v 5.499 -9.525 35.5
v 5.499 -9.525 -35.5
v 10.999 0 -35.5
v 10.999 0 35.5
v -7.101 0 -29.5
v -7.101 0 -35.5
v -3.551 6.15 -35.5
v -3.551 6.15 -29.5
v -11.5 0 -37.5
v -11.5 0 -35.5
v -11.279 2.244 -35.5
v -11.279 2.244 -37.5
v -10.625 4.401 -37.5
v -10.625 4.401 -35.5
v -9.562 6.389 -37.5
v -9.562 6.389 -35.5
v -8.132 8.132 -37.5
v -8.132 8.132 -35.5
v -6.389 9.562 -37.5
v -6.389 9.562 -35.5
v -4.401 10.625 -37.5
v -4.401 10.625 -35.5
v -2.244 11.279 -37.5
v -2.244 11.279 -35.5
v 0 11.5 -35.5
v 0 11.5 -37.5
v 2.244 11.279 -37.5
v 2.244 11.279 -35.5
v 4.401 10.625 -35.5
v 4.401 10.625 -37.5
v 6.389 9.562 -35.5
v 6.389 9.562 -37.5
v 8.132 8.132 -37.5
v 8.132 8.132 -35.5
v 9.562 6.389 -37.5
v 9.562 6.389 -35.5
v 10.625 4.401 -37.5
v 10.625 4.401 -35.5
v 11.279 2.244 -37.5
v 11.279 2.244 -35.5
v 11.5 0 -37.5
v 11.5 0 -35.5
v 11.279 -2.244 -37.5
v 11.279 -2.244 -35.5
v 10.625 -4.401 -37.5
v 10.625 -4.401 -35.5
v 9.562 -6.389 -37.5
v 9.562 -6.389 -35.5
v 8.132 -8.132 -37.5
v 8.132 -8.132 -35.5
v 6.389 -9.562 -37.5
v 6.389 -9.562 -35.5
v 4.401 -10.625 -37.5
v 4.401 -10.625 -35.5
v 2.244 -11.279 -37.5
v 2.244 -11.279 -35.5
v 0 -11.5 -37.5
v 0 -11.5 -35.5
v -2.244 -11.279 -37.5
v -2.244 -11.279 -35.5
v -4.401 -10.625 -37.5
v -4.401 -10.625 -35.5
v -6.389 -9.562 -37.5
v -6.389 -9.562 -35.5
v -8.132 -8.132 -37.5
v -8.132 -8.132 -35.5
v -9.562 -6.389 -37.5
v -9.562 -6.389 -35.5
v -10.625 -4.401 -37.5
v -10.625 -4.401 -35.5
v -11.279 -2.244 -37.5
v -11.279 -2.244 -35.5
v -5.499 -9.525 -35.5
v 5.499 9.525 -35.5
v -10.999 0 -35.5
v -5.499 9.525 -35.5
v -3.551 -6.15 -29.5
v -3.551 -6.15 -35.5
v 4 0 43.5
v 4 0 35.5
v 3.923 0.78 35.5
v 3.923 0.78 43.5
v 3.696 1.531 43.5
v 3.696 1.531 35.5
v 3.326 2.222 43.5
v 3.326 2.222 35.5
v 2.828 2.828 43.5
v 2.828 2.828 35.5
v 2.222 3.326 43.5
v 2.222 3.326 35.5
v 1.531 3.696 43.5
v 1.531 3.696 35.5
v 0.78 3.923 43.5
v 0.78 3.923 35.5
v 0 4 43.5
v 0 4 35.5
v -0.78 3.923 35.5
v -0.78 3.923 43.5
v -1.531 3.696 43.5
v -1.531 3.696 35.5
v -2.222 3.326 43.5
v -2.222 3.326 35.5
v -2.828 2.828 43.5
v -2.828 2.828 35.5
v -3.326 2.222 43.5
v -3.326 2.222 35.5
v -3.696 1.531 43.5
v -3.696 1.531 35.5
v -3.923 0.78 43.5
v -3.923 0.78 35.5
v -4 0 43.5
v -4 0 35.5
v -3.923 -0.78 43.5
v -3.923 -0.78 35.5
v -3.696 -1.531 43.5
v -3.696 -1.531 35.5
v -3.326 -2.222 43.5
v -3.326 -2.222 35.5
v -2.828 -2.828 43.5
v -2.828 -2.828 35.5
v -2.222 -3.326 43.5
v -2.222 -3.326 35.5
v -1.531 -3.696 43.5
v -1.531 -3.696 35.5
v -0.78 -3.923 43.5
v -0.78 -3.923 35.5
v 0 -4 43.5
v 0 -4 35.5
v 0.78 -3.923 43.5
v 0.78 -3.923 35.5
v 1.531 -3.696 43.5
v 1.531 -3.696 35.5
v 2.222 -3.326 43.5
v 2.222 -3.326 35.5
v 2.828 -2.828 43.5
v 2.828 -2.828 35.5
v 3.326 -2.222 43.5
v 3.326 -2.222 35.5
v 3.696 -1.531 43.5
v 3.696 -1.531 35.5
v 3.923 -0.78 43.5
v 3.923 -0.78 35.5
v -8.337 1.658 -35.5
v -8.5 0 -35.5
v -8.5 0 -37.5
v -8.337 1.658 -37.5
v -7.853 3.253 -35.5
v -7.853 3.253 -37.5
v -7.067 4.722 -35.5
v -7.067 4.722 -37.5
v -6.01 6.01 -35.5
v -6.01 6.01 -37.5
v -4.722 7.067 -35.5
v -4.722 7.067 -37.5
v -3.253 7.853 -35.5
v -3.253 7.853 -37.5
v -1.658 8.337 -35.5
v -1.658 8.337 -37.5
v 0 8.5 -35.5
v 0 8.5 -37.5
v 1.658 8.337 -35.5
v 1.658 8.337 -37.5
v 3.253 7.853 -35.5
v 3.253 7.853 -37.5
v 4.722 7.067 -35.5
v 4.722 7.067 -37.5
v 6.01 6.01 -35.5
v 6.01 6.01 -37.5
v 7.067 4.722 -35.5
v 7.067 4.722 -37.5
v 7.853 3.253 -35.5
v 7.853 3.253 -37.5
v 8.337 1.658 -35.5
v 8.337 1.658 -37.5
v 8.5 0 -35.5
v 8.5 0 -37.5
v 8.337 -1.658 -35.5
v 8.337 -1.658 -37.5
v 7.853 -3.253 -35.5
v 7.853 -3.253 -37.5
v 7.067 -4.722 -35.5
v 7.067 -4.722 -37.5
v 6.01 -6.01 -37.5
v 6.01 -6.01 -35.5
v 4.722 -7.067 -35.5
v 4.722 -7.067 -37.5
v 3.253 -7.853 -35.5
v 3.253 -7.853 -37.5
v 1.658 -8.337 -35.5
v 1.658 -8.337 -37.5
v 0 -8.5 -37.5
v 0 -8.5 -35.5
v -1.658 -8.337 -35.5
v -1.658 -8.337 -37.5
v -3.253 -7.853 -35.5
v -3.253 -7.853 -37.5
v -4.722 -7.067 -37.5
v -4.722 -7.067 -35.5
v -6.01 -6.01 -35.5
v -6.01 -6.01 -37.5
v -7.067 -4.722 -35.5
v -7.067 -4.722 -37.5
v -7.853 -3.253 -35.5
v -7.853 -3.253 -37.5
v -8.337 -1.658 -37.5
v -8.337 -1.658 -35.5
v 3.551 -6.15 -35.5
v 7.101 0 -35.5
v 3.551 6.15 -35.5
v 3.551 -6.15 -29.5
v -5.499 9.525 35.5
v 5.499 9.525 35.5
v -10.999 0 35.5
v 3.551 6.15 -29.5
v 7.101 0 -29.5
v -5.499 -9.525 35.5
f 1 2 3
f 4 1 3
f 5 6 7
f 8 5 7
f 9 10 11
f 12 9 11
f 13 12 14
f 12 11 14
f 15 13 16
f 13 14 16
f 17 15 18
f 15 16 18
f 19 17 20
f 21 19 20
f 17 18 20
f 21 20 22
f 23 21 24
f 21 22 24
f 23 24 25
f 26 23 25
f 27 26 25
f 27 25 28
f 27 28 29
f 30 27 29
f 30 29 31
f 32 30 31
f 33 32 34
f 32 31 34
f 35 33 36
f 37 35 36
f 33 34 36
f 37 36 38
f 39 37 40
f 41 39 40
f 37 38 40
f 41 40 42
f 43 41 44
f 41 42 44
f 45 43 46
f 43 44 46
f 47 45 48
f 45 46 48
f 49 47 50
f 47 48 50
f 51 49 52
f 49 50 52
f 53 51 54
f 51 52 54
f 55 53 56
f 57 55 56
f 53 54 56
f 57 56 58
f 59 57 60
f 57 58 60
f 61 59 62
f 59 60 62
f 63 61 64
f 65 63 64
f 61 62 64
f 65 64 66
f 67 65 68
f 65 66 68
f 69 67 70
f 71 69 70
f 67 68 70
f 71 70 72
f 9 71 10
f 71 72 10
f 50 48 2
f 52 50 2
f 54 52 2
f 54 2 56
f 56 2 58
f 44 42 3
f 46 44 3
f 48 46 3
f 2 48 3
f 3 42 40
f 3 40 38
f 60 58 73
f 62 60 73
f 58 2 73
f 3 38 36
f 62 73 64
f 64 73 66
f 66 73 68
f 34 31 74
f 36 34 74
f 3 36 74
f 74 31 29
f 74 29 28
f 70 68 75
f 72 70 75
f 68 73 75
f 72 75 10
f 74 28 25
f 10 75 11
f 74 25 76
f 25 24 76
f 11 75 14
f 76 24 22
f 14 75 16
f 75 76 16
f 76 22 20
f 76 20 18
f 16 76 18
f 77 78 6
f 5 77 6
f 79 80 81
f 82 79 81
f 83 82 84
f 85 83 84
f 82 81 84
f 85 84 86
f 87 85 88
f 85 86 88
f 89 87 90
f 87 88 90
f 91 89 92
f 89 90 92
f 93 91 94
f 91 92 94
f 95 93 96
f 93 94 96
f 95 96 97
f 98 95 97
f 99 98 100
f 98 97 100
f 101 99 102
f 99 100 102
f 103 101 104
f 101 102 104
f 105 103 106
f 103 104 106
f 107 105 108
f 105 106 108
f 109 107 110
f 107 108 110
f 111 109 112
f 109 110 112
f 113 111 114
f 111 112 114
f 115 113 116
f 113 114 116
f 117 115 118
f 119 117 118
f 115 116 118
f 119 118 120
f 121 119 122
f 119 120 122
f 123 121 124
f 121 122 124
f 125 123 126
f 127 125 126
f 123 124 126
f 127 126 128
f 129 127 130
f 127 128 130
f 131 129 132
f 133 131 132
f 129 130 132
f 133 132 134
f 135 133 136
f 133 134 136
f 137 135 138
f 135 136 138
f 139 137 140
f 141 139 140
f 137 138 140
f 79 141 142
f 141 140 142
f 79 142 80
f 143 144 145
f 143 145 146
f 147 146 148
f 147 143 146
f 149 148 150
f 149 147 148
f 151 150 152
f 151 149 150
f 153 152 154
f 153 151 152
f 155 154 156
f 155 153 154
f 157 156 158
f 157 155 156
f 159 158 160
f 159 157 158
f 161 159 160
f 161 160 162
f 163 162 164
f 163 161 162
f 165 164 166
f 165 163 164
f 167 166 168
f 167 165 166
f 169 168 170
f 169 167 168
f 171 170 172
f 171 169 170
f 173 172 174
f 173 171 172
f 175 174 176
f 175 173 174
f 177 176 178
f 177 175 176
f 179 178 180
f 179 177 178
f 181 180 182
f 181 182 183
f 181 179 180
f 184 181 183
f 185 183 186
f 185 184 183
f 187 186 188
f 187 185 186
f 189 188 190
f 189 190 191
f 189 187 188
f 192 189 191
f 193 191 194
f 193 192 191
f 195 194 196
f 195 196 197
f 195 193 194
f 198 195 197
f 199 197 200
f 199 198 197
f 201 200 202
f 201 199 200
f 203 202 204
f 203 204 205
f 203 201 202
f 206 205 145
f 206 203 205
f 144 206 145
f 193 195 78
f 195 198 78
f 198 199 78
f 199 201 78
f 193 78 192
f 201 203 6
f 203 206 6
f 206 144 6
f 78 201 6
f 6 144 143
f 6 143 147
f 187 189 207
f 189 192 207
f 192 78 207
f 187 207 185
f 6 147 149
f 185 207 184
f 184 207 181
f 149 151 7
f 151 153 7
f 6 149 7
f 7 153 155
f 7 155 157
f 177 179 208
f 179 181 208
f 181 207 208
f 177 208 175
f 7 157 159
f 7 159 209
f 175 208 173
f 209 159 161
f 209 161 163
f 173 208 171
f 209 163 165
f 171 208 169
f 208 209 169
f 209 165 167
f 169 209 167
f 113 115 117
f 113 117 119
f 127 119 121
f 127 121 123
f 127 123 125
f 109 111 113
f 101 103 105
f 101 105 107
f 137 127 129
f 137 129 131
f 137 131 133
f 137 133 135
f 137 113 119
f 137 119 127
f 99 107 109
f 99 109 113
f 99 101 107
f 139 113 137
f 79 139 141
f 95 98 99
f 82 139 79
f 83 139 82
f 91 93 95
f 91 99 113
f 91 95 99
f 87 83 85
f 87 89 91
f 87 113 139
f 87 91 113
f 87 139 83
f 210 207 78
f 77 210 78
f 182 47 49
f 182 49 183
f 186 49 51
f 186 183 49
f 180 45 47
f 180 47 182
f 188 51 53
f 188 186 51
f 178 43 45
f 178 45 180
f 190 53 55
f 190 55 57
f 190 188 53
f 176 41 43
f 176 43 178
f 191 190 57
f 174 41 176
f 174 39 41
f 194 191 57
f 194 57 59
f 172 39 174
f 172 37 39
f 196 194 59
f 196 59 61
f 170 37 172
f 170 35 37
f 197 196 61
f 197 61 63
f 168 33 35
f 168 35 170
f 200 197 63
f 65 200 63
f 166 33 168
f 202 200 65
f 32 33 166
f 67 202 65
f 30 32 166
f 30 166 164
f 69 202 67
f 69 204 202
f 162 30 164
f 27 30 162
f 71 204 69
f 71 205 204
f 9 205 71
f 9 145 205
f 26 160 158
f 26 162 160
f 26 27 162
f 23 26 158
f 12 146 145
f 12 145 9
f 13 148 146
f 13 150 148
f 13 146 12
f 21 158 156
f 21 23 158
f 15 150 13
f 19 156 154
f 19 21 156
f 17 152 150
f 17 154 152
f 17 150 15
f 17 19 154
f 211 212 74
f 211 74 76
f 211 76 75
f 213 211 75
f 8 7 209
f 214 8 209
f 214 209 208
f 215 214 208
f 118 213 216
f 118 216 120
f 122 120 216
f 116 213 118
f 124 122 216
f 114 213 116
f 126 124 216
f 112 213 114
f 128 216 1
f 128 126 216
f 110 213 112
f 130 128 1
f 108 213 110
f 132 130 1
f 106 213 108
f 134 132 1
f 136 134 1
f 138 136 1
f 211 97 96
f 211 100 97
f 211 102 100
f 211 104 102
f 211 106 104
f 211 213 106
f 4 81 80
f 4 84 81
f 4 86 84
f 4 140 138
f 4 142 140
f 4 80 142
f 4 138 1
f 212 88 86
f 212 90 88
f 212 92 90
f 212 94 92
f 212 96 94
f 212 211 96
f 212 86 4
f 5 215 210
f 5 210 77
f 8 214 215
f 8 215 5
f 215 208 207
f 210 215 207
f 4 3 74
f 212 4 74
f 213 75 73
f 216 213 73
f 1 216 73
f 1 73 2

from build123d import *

# Parameters (mm, degrees)
BOSS_EXTRUDE1_DEPTH      = 35.5
BOSS_EXTRUDE1_DEPTH_BACK = 35.5
CUT_EXTRUDE1_DEPTH       = 6
SKETCH4_R                = 11.5
SKETCH4_R_2              = 8.5
BOSS_EXTRUDE3_DEPTH      = 2
SKETCH5_R                = 4
BOSS_EXTRUDE4_DEPTH      = 8


with BuildPart() as part:
    # Sketch1 → Boss-Extrude1 (new, two sides: drawn at the far end of the back side and taken through both)
    with BuildSketch(Plane.XY.offset(-BOSS_EXTRUDE1_DEPTH_BACK)):
        Polygon((10.998522628, 0), (5.499261314, 9.525), (-5.499261314, 9.525), (-10.998522628, 0), (-5.499261314, -9.525), (5.499261314, -9.525), align=None)
    extrude(amount=BOSS_EXTRUDE1_DEPTH + BOSS_EXTRUDE1_DEPTH_BACK)

    # Sketch2 → Cut-Extrude1 (cut)
    with BuildSketch(Plane(origin=(0, 0, -35.5), x_dir=(-1, 0, 0), z_dir=(0, 0, -1))):
        Polygon((7.101408311, 0), (3.550704156, 6.15), (-3.550704156, 6.15), (-7.101408311, 0), (-3.550704156, -6.15), (3.550704156, -6.15), align=None)
    extrude(amount=-CUT_EXTRUDE1_DEPTH, mode=Mode.SUBTRACT)

    # Sketch4 → Boss-Extrude3 (add)
    with BuildSketch(Plane(origin=(0, 0, -35.5), x_dir=(-1, 0, 0), z_dir=(0, 0, -1))):
        Circle(SKETCH4_R)
        Circle(SKETCH4_R_2, mode=Mode.SUBTRACT)
    extrude(amount=BOSS_EXTRUDE3_DEPTH)

    # Sketch5 → Boss-Extrude4 (add)
    with BuildSketch(Plane.XY.offset(35.5)):
        Circle(SKETCH5_R)
    extrude(amount=BOSS_EXTRUDE4_DEPTH)


solid = part.part
